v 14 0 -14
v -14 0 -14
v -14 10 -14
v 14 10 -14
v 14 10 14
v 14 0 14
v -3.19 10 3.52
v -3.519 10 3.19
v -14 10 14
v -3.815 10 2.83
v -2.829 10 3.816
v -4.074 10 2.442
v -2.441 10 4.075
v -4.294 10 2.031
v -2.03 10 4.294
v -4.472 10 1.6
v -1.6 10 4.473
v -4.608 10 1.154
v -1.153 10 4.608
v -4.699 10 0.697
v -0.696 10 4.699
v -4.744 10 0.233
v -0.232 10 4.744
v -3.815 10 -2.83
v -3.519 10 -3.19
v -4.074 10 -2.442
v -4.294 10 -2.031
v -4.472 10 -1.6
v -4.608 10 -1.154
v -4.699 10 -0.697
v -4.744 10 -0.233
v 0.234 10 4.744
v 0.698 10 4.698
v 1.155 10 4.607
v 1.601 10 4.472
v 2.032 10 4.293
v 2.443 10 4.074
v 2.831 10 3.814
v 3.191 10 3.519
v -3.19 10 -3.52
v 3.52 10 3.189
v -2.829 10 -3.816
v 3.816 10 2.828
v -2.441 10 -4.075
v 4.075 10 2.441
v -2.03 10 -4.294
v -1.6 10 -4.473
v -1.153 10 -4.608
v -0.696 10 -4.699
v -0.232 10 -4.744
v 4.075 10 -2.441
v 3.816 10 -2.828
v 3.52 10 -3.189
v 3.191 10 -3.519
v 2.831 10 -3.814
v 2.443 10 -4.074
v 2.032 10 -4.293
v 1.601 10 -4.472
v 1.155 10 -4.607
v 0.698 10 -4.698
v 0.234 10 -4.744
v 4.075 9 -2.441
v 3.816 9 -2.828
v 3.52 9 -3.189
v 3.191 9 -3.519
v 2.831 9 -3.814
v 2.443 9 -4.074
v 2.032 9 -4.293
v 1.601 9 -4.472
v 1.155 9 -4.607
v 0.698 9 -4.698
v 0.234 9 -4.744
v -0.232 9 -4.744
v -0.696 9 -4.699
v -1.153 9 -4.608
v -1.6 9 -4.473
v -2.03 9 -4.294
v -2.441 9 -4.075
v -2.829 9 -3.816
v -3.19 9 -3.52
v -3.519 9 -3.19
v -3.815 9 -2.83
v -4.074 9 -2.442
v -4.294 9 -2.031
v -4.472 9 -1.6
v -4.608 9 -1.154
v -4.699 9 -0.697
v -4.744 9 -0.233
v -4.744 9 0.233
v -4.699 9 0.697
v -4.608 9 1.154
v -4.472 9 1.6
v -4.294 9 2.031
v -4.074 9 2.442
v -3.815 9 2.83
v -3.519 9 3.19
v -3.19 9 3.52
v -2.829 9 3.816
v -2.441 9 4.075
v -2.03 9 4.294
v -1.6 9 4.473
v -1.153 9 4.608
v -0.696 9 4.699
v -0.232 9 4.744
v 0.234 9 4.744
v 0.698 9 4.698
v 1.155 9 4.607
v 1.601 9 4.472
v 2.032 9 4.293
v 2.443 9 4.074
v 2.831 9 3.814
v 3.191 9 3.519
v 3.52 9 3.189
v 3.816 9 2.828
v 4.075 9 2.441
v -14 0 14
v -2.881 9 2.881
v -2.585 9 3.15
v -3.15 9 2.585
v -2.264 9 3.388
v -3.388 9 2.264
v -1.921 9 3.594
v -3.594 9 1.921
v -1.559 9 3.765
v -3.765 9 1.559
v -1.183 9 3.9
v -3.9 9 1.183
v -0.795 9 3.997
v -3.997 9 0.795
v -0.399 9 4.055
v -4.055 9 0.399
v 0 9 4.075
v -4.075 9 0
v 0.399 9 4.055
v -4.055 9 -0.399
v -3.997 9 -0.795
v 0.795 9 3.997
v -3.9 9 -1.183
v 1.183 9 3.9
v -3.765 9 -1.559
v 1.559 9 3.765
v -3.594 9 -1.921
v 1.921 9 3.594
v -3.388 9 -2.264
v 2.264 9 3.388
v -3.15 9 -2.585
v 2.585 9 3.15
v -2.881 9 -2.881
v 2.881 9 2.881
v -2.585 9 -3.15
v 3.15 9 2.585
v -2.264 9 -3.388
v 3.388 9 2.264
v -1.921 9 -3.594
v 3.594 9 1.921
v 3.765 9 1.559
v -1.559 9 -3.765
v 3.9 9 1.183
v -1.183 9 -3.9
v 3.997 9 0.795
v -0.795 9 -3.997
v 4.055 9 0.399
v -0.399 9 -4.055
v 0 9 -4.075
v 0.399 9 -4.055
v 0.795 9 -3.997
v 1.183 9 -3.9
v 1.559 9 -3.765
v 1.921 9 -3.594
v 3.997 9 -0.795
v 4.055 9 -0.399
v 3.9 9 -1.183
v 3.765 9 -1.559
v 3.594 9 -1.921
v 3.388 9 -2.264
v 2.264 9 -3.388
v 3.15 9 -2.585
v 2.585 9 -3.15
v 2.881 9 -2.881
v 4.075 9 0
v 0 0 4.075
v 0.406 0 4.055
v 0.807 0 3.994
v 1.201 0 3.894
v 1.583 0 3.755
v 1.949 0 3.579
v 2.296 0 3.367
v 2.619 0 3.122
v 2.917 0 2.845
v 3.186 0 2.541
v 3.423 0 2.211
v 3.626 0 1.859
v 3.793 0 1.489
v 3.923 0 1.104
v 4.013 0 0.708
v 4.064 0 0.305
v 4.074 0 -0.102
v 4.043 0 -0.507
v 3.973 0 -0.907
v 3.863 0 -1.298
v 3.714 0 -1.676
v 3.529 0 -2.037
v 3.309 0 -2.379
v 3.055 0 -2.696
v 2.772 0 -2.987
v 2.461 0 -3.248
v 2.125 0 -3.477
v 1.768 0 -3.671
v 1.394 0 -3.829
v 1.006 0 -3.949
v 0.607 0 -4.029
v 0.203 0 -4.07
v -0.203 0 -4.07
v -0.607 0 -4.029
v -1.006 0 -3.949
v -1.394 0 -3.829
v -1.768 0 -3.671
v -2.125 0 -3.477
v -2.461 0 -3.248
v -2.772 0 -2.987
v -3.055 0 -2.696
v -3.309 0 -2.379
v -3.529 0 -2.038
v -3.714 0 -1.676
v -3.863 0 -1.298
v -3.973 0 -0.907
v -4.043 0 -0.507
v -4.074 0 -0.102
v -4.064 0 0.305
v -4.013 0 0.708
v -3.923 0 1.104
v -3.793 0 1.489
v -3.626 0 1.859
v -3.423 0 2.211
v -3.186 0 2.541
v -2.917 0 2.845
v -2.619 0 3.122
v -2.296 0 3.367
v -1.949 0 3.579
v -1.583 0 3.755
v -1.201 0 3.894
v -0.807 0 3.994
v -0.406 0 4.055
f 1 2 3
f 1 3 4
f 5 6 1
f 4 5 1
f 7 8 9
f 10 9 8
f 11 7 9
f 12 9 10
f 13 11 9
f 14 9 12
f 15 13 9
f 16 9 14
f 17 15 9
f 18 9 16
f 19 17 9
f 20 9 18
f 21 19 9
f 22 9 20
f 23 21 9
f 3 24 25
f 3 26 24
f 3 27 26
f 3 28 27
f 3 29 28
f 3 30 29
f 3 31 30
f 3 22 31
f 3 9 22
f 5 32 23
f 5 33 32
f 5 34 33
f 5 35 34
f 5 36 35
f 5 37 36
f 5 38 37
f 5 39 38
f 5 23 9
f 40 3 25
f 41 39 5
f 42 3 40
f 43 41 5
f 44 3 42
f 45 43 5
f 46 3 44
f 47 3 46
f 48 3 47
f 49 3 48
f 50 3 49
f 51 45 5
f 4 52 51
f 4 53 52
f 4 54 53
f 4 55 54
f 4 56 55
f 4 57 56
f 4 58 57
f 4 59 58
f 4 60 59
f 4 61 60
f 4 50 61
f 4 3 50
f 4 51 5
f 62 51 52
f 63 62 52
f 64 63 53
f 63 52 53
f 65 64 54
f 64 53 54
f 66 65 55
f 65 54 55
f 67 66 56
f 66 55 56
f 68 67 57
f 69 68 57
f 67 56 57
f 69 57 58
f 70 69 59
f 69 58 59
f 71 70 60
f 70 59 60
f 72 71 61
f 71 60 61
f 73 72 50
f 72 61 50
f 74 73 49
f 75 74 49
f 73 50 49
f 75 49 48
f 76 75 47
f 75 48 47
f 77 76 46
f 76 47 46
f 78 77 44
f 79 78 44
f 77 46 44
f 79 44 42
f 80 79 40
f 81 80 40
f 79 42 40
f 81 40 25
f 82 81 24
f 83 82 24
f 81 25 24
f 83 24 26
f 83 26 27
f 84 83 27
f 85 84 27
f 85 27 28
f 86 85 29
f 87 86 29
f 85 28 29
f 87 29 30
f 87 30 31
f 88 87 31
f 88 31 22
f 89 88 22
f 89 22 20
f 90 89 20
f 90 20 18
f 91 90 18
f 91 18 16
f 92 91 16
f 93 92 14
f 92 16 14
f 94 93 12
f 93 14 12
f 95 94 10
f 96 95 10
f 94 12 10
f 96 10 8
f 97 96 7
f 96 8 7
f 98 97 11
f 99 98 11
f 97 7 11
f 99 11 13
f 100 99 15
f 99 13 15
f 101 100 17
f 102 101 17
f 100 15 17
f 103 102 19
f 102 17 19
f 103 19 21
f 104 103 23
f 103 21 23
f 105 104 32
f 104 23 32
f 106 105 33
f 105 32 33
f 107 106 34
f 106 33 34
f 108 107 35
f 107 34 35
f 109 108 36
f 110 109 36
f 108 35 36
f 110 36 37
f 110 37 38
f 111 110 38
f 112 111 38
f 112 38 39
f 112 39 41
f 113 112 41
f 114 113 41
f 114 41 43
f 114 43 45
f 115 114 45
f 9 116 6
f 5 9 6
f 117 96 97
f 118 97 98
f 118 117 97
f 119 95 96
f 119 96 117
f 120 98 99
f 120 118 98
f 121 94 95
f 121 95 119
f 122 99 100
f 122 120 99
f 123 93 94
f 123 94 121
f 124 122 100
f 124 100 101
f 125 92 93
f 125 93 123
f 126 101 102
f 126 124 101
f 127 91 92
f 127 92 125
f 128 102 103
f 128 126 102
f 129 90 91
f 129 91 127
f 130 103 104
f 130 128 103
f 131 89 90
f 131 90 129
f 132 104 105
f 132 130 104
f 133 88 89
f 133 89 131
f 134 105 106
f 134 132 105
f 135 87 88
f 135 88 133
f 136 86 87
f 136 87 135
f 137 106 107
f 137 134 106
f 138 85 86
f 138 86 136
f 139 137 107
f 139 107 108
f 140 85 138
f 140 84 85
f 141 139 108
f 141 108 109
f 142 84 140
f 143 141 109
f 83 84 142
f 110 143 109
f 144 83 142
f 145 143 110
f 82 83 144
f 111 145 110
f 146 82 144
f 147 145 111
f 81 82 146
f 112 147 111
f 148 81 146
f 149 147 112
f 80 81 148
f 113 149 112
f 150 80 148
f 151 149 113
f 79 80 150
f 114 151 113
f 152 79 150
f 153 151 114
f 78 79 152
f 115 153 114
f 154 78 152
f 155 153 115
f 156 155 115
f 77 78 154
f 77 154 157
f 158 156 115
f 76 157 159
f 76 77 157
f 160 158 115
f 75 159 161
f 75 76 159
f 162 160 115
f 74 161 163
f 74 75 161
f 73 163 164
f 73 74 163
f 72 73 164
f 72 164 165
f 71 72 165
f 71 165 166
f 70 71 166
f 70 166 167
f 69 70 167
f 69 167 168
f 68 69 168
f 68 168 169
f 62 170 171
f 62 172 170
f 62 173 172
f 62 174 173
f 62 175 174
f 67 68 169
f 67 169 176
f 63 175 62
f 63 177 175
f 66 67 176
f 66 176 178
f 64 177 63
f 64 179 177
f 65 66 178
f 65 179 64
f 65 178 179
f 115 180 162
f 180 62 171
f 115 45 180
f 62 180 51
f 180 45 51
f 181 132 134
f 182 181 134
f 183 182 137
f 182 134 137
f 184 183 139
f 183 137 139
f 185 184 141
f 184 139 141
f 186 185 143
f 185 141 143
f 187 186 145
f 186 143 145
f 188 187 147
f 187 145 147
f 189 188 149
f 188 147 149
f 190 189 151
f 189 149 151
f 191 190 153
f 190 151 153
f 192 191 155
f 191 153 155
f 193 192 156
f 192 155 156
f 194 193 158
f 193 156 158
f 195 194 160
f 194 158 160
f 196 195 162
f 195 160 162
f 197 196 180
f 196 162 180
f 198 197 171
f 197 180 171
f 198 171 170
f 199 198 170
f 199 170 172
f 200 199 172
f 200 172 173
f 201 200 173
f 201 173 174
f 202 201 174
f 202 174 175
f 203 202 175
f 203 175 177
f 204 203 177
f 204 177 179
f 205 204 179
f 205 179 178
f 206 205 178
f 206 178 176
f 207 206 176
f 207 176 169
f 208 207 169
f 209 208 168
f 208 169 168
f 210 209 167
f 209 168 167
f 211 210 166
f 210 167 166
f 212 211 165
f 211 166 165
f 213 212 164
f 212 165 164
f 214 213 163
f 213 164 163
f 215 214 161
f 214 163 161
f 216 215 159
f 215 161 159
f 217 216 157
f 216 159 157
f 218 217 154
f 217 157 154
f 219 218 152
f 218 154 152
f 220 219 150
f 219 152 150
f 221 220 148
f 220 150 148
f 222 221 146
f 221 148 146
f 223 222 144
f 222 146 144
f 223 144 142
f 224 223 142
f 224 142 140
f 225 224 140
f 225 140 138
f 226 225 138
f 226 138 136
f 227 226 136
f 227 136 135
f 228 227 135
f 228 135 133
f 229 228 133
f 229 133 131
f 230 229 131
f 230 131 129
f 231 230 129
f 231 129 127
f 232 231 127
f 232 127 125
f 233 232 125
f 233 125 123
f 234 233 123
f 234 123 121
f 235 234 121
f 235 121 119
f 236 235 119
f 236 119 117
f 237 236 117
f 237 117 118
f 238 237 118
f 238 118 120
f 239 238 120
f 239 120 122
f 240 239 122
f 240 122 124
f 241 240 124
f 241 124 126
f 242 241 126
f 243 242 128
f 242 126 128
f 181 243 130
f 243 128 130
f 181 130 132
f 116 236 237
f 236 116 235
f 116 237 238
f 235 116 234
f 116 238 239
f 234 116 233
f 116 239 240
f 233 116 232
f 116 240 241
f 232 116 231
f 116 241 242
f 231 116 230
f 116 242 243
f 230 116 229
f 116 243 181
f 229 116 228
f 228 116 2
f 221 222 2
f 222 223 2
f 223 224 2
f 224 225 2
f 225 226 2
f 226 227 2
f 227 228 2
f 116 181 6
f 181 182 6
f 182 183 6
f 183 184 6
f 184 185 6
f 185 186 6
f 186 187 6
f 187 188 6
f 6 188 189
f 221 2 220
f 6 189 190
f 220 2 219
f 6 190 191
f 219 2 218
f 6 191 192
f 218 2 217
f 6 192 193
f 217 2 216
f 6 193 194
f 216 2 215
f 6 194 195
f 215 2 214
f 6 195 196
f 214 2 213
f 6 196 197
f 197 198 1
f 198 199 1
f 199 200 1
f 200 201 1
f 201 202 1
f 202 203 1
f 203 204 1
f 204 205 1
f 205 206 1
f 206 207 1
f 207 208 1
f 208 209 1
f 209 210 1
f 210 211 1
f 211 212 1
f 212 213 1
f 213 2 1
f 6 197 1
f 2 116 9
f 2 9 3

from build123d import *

# Parameters (mm, degrees)
SKETCH1_W           = 28
SKETCH1_H           = 28
BOSS_EXTRUDE1_DEPTH = 10
SKETCH2_R           = 4.075
CUT_EXTRUDE1_DEPTH  = 23.181073013
CUT_EXTRUDE2_DEPTH  = 1


with BuildPart() as part:
    # Sketch1 → Boss-Extrude1 (new body)
    with BuildSketch(Plane(origin=(0, 0, 0), x_dir=(1, 0, 0), z_dir=(0, 1, 0))):
        Rectangle(SKETCH1_W, SKETCH1_H)
    extrude(amount=BOSS_EXTRUDE1_DEPTH)

    # Sketch2 → Cut-Extrude1 (cut, through all)
    with BuildSketch(Plane(origin=(0, 10, 0), x_dir=(1, 0, 0), z_dir=(0, 1, 0))):
        with Locations(Location((0, 0, 0), (0, 0, 270))):
            Circle(SKETCH2_R)
    extrude(amount=-CUT_EXTRUDE1_DEPTH, mode=Mode.SUBTRACT)

    # Sketch3 → Cut-Extrude2 (cut)
    with BuildSketch(Plane(origin=(0, 10, 0), x_dir=(1, 0, 0), z_dir=(0, 1, 0))):
        with BuildLine():
            Line((4.075, -2.440671014), (4.075, 2.440671014))
            ThreePointArc((4.075, 2.440671014), (-4.75, 0), (4.075, -2.440671014))
        make_face()
    extrude(amount=-CUT_EXTRUDE2_DEPTH, mode=Mode.SUBTRACT)


solid = part.part
